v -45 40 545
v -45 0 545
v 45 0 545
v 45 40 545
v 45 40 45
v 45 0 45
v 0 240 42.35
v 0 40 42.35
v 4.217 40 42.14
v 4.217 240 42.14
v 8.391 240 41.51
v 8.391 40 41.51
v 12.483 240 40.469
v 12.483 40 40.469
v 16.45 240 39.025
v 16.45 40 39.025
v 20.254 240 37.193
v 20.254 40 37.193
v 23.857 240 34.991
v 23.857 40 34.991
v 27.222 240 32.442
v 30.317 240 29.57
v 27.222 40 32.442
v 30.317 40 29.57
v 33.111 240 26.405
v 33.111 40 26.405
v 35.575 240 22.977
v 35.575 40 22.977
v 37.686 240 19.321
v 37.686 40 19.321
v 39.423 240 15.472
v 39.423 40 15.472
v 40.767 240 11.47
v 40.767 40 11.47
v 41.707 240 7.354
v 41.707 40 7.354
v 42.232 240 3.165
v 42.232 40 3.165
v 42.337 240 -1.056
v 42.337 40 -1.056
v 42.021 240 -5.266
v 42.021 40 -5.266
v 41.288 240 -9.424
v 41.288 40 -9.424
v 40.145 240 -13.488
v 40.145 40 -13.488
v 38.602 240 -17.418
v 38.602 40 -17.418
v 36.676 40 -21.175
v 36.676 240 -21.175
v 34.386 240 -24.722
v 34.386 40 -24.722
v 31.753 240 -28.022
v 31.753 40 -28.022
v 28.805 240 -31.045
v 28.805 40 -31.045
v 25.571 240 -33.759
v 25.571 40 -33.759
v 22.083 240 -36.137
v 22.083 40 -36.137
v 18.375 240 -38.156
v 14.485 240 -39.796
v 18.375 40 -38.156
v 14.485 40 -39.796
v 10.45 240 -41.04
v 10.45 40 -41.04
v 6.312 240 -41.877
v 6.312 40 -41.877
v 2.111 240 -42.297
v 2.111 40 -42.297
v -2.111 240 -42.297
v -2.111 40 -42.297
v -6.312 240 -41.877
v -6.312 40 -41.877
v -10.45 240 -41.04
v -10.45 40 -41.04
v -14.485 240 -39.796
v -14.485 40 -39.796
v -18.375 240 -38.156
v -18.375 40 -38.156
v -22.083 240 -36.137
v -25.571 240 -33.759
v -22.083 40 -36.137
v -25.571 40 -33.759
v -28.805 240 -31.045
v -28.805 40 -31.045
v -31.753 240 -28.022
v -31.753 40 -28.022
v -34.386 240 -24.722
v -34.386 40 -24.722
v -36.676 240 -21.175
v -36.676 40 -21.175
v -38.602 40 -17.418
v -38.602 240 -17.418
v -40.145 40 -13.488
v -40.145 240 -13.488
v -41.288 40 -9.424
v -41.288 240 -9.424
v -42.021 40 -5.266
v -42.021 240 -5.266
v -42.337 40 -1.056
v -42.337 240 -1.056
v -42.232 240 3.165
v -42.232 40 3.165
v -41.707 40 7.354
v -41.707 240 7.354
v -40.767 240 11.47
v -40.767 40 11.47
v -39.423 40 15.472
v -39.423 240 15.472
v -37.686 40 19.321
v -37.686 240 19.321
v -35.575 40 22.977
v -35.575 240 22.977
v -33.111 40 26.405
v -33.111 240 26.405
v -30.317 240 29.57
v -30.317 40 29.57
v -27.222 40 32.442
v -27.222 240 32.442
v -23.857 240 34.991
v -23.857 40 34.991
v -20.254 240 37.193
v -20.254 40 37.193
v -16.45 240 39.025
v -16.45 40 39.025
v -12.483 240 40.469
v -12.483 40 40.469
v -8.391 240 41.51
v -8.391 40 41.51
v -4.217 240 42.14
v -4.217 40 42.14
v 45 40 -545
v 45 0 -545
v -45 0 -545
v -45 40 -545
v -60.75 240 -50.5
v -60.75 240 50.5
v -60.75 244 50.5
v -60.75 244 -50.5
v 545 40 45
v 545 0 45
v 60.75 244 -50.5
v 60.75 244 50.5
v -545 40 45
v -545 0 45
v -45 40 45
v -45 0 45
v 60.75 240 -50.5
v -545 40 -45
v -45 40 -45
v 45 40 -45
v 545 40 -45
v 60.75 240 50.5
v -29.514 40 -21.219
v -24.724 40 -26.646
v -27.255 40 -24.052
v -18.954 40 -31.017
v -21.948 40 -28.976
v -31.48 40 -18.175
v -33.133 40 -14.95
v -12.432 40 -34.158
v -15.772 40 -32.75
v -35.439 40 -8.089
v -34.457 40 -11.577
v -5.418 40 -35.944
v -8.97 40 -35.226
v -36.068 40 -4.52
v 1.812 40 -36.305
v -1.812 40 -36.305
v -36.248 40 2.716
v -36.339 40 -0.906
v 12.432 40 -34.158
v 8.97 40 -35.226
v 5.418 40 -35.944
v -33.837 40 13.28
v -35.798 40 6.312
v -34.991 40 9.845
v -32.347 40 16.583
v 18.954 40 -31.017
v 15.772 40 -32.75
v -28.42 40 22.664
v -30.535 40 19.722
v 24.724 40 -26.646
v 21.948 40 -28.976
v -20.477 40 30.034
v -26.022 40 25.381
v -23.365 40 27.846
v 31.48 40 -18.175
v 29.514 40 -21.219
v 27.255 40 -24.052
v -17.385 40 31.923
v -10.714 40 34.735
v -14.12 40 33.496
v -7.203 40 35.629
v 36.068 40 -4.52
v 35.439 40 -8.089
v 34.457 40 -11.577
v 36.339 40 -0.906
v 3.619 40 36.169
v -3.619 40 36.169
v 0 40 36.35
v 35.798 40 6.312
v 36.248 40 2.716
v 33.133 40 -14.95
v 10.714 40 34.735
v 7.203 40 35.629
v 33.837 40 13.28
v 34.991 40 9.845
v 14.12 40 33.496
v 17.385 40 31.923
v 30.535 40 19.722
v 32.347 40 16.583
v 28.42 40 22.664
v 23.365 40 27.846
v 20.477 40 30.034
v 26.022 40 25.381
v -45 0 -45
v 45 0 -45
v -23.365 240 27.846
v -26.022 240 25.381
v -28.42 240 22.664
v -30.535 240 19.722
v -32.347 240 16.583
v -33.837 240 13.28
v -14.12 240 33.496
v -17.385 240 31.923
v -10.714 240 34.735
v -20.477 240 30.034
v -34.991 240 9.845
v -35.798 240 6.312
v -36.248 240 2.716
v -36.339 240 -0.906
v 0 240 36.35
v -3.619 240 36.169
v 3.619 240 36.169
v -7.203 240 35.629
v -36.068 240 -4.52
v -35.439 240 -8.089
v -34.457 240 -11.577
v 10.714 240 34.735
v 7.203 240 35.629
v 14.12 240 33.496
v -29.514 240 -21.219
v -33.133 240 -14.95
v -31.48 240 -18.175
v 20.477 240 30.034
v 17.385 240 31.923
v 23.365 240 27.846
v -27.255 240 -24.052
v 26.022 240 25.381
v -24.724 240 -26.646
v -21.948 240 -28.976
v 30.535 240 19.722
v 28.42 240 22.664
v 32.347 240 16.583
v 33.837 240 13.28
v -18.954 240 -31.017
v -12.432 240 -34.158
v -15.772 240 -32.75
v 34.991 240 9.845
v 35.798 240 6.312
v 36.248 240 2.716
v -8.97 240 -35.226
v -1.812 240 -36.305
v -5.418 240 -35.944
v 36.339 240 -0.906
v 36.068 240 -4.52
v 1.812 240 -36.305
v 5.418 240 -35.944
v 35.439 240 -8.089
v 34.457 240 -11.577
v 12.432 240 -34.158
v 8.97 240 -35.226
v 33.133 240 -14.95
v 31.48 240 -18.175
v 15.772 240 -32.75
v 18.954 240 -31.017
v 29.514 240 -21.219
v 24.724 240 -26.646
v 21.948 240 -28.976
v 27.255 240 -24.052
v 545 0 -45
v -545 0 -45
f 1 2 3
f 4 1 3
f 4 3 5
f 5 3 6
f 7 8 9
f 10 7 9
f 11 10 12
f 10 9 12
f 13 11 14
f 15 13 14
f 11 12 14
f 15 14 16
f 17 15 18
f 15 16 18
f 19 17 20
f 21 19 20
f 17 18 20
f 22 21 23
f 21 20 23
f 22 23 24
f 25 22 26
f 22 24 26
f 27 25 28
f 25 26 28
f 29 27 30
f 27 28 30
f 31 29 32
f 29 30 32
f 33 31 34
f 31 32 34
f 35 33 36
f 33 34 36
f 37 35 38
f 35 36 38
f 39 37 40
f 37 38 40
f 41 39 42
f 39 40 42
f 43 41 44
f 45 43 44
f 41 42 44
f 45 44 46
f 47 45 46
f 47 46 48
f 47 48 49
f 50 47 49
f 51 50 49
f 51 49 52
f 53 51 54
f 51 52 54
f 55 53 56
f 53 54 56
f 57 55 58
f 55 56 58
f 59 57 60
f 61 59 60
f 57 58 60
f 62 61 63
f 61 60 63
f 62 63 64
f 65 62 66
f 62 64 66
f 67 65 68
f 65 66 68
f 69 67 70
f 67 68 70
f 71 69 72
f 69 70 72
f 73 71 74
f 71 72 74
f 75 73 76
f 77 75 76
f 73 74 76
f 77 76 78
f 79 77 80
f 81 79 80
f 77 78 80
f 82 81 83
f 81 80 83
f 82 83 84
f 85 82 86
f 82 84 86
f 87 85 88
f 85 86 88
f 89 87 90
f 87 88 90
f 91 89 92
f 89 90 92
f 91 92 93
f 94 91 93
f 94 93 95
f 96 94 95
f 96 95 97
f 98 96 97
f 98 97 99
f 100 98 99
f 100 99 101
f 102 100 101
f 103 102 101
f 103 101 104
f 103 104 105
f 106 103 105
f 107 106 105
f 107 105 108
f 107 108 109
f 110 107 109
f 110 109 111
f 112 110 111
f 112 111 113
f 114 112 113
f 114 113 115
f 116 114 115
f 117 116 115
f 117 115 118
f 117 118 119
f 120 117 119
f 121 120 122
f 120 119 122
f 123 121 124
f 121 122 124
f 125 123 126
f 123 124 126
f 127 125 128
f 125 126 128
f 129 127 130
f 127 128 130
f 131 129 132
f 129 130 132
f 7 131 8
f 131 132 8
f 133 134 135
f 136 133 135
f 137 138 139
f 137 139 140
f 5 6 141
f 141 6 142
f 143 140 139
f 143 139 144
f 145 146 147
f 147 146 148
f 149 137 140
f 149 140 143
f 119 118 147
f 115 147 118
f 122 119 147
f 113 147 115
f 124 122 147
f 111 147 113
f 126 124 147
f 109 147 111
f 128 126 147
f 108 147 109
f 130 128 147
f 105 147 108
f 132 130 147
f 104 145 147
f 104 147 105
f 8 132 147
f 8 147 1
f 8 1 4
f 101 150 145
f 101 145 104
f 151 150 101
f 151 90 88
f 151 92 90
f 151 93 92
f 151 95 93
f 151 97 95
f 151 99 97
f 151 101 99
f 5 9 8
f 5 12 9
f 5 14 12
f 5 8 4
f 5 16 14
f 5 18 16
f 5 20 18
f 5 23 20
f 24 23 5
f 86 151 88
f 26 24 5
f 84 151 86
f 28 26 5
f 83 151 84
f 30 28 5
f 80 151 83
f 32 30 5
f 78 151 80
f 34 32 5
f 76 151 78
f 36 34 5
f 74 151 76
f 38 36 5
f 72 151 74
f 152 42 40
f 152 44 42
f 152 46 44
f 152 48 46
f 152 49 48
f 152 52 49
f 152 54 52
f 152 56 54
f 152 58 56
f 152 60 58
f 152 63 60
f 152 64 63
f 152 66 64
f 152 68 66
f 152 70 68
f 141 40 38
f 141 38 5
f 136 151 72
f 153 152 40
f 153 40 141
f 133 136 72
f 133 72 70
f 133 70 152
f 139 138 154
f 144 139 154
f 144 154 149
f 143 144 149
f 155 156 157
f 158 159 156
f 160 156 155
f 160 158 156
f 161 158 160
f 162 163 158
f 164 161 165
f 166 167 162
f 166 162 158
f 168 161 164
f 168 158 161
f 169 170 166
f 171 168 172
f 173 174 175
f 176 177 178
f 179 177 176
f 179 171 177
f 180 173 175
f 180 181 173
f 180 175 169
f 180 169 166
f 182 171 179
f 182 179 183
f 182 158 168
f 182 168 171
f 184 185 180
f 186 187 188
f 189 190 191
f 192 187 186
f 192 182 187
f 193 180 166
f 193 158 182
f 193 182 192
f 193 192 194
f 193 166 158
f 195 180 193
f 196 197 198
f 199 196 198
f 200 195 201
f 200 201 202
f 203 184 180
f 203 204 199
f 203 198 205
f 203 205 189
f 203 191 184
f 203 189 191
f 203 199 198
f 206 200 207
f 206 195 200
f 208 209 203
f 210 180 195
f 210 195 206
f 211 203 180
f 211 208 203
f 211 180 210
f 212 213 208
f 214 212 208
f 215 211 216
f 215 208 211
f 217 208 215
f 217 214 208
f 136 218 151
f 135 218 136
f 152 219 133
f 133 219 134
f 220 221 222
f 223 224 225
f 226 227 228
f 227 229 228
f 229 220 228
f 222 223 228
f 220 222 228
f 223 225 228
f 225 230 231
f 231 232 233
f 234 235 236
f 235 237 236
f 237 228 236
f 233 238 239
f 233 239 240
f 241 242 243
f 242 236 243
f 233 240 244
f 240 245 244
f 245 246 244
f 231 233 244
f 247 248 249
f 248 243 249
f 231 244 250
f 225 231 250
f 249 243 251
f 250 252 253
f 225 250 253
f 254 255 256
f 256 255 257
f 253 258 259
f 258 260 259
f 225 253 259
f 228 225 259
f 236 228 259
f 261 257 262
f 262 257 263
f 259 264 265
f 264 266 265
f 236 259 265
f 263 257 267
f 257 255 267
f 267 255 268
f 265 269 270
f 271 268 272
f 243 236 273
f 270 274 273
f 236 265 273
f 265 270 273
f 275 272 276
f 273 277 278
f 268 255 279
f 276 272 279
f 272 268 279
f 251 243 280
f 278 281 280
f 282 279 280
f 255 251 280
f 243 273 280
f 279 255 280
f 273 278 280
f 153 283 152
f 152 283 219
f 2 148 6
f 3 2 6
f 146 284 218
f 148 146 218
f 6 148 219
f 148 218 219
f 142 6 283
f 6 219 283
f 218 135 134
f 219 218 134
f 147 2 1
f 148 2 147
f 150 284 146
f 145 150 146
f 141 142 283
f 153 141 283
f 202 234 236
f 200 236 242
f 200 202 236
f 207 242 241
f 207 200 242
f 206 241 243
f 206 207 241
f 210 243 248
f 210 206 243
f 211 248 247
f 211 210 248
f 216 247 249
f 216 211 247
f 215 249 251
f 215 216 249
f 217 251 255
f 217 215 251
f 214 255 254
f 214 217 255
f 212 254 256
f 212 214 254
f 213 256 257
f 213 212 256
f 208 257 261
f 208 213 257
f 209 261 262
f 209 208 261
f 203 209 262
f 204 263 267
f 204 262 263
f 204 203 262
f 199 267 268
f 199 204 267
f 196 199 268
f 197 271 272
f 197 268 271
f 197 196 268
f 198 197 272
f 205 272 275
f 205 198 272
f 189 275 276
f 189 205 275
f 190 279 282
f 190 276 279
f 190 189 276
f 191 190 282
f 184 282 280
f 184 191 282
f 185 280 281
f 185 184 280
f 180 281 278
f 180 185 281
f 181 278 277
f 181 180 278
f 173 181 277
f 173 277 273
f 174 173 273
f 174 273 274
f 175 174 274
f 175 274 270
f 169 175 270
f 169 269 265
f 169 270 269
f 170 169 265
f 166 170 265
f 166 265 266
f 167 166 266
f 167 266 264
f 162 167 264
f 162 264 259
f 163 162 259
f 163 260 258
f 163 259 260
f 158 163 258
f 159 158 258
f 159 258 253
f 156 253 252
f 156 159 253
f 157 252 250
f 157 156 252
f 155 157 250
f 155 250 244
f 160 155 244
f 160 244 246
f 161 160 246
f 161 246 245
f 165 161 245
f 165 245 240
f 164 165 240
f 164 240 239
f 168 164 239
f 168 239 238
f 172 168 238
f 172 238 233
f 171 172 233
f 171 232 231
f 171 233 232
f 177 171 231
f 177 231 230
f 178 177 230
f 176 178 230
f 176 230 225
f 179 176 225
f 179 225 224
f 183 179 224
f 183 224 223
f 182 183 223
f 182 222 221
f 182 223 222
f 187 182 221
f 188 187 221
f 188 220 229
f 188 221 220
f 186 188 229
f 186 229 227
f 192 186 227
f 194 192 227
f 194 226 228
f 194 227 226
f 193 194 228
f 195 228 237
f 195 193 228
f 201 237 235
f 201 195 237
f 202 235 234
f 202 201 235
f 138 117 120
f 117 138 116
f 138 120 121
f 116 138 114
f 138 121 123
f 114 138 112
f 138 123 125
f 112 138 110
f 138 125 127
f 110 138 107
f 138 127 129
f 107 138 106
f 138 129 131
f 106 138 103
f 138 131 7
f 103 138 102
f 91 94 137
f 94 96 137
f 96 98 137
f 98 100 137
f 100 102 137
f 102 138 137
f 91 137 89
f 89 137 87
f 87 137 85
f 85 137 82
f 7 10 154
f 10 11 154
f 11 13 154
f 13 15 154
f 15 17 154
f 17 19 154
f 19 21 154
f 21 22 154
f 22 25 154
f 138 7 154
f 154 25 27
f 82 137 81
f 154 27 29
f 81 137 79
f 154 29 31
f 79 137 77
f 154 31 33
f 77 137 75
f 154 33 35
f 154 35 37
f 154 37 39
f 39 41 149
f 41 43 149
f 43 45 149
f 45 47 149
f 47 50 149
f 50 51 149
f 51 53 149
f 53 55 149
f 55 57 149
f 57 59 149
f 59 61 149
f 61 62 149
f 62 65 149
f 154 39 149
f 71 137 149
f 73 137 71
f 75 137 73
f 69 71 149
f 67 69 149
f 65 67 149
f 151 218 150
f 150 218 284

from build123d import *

# Parameters (mm, degrees)
CROQUIS1_W                   = 45
CROQUIS1_H                   = 500
CROQUIS1_W_2                 = 500
CROQUIS1_H_2                 = 45
CROQUIS1_R                   = 45
SALIENTE_EXTRUIR1_DEPTH      = 40
CROQUIS2_R                   = 42.35
SALIENTE_EXTRUIR2_DEPTH      = 200
CROQUIS3_R                   = 39.35
CORTAR_EXTRUIR1_DEPTH        = 200
SALIENTE_EXTRUIR3_DEPTH      = 4
SALIENTE_EXTRUIR3_DEPTH_BACK = 200
CROQUIS4_R                   = 39.35
CROQUIS4_R_2                 = 36.35
CROQUIS6_W                   = 121.5
CROQUIS6_H                   = 101
SALIENTE_EXTRUIR4_DEPTH      = 4


with BuildPart() as part:
    # Croquis1 → Saliente-Extruir1 (new body)
    with BuildSketch(Plane(origin=(0, 0, 0), x_dir=(1, 0, 0), z_dir=(0, 1, 0))):
        with Locations((22.5, -295)):
            Rectangle(CROQUIS1_W, CROQUIS1_H)
        with Locations((-22.5, -295)):
            Rectangle(CROQUIS1_W, CROQUIS1_H)
        with Locations((295, -22.5)):
            Rectangle(CROQUIS1_W_2, CROQUIS1_H_2)
        with Locations((295, 22.5)):
            Rectangle(CROQUIS1_W_2, CROQUIS1_H_2)
        with Locations((-295, 22.5)):
            Rectangle(CROQUIS1_W_2, CROQUIS1_H_2)
        with Locations((-295, -22.5)):
            Rectangle(CROQUIS1_W_2, CROQUIS1_H_2)
        with BuildLine():
            Line((-45, -45), (0, -45))
            ThreePointArc((0, -45), (-31.819805153, -31.819805153), (-45, 0))
            Line((-45, 0), (-45, -45))
        make_face()
        with BuildLine():
            ThreePointArc((0, 45), (31.819805153, 31.819805153), (45, 0))
            Line((45, 0), (45, 45))
            Line((45, 45), (0, 45))
        make_face()
        with BuildLine():
            ThreePointArc((-45, 0), (-31.819805153, 31.819805153), (0, 45))
            Line((0, 45), (-45, 45))
            Line((-45, 45), (-45, 0))
        make_face()
        with Locations((-22.5, 295)):
            Rectangle(CROQUIS1_W, CROQUIS1_H)
        with Locations((22.5, 295)):
            Rectangle(CROQUIS1_W, CROQUIS1_H)
        with BuildLine():
            Line((45, -45), (45, 0))
            ThreePointArc((45, 0), (31.819805153, -31.819805153), (0, -45))
            Line((0, -45), (45, -45))
        make_face()
        Circle(CROQUIS1_R)
    extrude(amount=SALIENTE_EXTRUIR1_DEPTH)

    # Croquis2 → Saliente-Extruir2 (add)
    with BuildSketch(Plane(origin=(0, 40, 0), x_dir=(1, 0, 0), z_dir=(0, 1, 0))):
        with Locations(Location((0, 0, 0), (0, 0, 270))):
            Circle(CROQUIS2_R)
    extrude(amount=SALIENTE_EXTRUIR2_DEPTH)

    # Croquis3 → Cortar-Extruir1 (cut)
    with BuildSketch(Plane(origin=(0, 240, 0), x_dir=(1, 0, 0), z_dir=(0, 1, 0))):
        with Locations(Location((0, 0, 0), (0, 0, 270))):
            Circle(CROQUIS3_R)
    extrude(amount=-CORTAR_EXTRUIR1_DEPTH, mode=Mode.SUBTRACT)

    # Croquis4 → Saliente-Extruir3 (add, two sides: drawn at the far end of the back side and taken through both)
    with BuildSketch(Plane(origin=(0, 240, 0), x_dir=(1, 0, 0), z_dir=(0, 1, 0)).offset(-SALIENTE_EXTRUIR3_DEPTH_BACK)):
        with Locations(Location((0, 0, 0), (0, 0, 270))):
            Circle(CROQUIS4_R)
        with Locations(Location((0, 0, 0), (0, 0, 270))):
            Circle(CROQUIS4_R_2, mode=Mode.SUBTRACT)
    extrude(amount=SALIENTE_EXTRUIR3_DEPTH + SALIENTE_EXTRUIR3_DEPTH_BACK)

    # Croquis6 → Saliente-Extruir4 (add)
    with BuildSketch(Plane(origin=(0, 240, 0), x_dir=(1, 0, 0), z_dir=(0, 1, 0))):
        Rectangle(CROQUIS6_W, CROQUIS6_H)
    extrude(amount=SALIENTE_EXTRUIR4_DEPTH)


solid = part.part
